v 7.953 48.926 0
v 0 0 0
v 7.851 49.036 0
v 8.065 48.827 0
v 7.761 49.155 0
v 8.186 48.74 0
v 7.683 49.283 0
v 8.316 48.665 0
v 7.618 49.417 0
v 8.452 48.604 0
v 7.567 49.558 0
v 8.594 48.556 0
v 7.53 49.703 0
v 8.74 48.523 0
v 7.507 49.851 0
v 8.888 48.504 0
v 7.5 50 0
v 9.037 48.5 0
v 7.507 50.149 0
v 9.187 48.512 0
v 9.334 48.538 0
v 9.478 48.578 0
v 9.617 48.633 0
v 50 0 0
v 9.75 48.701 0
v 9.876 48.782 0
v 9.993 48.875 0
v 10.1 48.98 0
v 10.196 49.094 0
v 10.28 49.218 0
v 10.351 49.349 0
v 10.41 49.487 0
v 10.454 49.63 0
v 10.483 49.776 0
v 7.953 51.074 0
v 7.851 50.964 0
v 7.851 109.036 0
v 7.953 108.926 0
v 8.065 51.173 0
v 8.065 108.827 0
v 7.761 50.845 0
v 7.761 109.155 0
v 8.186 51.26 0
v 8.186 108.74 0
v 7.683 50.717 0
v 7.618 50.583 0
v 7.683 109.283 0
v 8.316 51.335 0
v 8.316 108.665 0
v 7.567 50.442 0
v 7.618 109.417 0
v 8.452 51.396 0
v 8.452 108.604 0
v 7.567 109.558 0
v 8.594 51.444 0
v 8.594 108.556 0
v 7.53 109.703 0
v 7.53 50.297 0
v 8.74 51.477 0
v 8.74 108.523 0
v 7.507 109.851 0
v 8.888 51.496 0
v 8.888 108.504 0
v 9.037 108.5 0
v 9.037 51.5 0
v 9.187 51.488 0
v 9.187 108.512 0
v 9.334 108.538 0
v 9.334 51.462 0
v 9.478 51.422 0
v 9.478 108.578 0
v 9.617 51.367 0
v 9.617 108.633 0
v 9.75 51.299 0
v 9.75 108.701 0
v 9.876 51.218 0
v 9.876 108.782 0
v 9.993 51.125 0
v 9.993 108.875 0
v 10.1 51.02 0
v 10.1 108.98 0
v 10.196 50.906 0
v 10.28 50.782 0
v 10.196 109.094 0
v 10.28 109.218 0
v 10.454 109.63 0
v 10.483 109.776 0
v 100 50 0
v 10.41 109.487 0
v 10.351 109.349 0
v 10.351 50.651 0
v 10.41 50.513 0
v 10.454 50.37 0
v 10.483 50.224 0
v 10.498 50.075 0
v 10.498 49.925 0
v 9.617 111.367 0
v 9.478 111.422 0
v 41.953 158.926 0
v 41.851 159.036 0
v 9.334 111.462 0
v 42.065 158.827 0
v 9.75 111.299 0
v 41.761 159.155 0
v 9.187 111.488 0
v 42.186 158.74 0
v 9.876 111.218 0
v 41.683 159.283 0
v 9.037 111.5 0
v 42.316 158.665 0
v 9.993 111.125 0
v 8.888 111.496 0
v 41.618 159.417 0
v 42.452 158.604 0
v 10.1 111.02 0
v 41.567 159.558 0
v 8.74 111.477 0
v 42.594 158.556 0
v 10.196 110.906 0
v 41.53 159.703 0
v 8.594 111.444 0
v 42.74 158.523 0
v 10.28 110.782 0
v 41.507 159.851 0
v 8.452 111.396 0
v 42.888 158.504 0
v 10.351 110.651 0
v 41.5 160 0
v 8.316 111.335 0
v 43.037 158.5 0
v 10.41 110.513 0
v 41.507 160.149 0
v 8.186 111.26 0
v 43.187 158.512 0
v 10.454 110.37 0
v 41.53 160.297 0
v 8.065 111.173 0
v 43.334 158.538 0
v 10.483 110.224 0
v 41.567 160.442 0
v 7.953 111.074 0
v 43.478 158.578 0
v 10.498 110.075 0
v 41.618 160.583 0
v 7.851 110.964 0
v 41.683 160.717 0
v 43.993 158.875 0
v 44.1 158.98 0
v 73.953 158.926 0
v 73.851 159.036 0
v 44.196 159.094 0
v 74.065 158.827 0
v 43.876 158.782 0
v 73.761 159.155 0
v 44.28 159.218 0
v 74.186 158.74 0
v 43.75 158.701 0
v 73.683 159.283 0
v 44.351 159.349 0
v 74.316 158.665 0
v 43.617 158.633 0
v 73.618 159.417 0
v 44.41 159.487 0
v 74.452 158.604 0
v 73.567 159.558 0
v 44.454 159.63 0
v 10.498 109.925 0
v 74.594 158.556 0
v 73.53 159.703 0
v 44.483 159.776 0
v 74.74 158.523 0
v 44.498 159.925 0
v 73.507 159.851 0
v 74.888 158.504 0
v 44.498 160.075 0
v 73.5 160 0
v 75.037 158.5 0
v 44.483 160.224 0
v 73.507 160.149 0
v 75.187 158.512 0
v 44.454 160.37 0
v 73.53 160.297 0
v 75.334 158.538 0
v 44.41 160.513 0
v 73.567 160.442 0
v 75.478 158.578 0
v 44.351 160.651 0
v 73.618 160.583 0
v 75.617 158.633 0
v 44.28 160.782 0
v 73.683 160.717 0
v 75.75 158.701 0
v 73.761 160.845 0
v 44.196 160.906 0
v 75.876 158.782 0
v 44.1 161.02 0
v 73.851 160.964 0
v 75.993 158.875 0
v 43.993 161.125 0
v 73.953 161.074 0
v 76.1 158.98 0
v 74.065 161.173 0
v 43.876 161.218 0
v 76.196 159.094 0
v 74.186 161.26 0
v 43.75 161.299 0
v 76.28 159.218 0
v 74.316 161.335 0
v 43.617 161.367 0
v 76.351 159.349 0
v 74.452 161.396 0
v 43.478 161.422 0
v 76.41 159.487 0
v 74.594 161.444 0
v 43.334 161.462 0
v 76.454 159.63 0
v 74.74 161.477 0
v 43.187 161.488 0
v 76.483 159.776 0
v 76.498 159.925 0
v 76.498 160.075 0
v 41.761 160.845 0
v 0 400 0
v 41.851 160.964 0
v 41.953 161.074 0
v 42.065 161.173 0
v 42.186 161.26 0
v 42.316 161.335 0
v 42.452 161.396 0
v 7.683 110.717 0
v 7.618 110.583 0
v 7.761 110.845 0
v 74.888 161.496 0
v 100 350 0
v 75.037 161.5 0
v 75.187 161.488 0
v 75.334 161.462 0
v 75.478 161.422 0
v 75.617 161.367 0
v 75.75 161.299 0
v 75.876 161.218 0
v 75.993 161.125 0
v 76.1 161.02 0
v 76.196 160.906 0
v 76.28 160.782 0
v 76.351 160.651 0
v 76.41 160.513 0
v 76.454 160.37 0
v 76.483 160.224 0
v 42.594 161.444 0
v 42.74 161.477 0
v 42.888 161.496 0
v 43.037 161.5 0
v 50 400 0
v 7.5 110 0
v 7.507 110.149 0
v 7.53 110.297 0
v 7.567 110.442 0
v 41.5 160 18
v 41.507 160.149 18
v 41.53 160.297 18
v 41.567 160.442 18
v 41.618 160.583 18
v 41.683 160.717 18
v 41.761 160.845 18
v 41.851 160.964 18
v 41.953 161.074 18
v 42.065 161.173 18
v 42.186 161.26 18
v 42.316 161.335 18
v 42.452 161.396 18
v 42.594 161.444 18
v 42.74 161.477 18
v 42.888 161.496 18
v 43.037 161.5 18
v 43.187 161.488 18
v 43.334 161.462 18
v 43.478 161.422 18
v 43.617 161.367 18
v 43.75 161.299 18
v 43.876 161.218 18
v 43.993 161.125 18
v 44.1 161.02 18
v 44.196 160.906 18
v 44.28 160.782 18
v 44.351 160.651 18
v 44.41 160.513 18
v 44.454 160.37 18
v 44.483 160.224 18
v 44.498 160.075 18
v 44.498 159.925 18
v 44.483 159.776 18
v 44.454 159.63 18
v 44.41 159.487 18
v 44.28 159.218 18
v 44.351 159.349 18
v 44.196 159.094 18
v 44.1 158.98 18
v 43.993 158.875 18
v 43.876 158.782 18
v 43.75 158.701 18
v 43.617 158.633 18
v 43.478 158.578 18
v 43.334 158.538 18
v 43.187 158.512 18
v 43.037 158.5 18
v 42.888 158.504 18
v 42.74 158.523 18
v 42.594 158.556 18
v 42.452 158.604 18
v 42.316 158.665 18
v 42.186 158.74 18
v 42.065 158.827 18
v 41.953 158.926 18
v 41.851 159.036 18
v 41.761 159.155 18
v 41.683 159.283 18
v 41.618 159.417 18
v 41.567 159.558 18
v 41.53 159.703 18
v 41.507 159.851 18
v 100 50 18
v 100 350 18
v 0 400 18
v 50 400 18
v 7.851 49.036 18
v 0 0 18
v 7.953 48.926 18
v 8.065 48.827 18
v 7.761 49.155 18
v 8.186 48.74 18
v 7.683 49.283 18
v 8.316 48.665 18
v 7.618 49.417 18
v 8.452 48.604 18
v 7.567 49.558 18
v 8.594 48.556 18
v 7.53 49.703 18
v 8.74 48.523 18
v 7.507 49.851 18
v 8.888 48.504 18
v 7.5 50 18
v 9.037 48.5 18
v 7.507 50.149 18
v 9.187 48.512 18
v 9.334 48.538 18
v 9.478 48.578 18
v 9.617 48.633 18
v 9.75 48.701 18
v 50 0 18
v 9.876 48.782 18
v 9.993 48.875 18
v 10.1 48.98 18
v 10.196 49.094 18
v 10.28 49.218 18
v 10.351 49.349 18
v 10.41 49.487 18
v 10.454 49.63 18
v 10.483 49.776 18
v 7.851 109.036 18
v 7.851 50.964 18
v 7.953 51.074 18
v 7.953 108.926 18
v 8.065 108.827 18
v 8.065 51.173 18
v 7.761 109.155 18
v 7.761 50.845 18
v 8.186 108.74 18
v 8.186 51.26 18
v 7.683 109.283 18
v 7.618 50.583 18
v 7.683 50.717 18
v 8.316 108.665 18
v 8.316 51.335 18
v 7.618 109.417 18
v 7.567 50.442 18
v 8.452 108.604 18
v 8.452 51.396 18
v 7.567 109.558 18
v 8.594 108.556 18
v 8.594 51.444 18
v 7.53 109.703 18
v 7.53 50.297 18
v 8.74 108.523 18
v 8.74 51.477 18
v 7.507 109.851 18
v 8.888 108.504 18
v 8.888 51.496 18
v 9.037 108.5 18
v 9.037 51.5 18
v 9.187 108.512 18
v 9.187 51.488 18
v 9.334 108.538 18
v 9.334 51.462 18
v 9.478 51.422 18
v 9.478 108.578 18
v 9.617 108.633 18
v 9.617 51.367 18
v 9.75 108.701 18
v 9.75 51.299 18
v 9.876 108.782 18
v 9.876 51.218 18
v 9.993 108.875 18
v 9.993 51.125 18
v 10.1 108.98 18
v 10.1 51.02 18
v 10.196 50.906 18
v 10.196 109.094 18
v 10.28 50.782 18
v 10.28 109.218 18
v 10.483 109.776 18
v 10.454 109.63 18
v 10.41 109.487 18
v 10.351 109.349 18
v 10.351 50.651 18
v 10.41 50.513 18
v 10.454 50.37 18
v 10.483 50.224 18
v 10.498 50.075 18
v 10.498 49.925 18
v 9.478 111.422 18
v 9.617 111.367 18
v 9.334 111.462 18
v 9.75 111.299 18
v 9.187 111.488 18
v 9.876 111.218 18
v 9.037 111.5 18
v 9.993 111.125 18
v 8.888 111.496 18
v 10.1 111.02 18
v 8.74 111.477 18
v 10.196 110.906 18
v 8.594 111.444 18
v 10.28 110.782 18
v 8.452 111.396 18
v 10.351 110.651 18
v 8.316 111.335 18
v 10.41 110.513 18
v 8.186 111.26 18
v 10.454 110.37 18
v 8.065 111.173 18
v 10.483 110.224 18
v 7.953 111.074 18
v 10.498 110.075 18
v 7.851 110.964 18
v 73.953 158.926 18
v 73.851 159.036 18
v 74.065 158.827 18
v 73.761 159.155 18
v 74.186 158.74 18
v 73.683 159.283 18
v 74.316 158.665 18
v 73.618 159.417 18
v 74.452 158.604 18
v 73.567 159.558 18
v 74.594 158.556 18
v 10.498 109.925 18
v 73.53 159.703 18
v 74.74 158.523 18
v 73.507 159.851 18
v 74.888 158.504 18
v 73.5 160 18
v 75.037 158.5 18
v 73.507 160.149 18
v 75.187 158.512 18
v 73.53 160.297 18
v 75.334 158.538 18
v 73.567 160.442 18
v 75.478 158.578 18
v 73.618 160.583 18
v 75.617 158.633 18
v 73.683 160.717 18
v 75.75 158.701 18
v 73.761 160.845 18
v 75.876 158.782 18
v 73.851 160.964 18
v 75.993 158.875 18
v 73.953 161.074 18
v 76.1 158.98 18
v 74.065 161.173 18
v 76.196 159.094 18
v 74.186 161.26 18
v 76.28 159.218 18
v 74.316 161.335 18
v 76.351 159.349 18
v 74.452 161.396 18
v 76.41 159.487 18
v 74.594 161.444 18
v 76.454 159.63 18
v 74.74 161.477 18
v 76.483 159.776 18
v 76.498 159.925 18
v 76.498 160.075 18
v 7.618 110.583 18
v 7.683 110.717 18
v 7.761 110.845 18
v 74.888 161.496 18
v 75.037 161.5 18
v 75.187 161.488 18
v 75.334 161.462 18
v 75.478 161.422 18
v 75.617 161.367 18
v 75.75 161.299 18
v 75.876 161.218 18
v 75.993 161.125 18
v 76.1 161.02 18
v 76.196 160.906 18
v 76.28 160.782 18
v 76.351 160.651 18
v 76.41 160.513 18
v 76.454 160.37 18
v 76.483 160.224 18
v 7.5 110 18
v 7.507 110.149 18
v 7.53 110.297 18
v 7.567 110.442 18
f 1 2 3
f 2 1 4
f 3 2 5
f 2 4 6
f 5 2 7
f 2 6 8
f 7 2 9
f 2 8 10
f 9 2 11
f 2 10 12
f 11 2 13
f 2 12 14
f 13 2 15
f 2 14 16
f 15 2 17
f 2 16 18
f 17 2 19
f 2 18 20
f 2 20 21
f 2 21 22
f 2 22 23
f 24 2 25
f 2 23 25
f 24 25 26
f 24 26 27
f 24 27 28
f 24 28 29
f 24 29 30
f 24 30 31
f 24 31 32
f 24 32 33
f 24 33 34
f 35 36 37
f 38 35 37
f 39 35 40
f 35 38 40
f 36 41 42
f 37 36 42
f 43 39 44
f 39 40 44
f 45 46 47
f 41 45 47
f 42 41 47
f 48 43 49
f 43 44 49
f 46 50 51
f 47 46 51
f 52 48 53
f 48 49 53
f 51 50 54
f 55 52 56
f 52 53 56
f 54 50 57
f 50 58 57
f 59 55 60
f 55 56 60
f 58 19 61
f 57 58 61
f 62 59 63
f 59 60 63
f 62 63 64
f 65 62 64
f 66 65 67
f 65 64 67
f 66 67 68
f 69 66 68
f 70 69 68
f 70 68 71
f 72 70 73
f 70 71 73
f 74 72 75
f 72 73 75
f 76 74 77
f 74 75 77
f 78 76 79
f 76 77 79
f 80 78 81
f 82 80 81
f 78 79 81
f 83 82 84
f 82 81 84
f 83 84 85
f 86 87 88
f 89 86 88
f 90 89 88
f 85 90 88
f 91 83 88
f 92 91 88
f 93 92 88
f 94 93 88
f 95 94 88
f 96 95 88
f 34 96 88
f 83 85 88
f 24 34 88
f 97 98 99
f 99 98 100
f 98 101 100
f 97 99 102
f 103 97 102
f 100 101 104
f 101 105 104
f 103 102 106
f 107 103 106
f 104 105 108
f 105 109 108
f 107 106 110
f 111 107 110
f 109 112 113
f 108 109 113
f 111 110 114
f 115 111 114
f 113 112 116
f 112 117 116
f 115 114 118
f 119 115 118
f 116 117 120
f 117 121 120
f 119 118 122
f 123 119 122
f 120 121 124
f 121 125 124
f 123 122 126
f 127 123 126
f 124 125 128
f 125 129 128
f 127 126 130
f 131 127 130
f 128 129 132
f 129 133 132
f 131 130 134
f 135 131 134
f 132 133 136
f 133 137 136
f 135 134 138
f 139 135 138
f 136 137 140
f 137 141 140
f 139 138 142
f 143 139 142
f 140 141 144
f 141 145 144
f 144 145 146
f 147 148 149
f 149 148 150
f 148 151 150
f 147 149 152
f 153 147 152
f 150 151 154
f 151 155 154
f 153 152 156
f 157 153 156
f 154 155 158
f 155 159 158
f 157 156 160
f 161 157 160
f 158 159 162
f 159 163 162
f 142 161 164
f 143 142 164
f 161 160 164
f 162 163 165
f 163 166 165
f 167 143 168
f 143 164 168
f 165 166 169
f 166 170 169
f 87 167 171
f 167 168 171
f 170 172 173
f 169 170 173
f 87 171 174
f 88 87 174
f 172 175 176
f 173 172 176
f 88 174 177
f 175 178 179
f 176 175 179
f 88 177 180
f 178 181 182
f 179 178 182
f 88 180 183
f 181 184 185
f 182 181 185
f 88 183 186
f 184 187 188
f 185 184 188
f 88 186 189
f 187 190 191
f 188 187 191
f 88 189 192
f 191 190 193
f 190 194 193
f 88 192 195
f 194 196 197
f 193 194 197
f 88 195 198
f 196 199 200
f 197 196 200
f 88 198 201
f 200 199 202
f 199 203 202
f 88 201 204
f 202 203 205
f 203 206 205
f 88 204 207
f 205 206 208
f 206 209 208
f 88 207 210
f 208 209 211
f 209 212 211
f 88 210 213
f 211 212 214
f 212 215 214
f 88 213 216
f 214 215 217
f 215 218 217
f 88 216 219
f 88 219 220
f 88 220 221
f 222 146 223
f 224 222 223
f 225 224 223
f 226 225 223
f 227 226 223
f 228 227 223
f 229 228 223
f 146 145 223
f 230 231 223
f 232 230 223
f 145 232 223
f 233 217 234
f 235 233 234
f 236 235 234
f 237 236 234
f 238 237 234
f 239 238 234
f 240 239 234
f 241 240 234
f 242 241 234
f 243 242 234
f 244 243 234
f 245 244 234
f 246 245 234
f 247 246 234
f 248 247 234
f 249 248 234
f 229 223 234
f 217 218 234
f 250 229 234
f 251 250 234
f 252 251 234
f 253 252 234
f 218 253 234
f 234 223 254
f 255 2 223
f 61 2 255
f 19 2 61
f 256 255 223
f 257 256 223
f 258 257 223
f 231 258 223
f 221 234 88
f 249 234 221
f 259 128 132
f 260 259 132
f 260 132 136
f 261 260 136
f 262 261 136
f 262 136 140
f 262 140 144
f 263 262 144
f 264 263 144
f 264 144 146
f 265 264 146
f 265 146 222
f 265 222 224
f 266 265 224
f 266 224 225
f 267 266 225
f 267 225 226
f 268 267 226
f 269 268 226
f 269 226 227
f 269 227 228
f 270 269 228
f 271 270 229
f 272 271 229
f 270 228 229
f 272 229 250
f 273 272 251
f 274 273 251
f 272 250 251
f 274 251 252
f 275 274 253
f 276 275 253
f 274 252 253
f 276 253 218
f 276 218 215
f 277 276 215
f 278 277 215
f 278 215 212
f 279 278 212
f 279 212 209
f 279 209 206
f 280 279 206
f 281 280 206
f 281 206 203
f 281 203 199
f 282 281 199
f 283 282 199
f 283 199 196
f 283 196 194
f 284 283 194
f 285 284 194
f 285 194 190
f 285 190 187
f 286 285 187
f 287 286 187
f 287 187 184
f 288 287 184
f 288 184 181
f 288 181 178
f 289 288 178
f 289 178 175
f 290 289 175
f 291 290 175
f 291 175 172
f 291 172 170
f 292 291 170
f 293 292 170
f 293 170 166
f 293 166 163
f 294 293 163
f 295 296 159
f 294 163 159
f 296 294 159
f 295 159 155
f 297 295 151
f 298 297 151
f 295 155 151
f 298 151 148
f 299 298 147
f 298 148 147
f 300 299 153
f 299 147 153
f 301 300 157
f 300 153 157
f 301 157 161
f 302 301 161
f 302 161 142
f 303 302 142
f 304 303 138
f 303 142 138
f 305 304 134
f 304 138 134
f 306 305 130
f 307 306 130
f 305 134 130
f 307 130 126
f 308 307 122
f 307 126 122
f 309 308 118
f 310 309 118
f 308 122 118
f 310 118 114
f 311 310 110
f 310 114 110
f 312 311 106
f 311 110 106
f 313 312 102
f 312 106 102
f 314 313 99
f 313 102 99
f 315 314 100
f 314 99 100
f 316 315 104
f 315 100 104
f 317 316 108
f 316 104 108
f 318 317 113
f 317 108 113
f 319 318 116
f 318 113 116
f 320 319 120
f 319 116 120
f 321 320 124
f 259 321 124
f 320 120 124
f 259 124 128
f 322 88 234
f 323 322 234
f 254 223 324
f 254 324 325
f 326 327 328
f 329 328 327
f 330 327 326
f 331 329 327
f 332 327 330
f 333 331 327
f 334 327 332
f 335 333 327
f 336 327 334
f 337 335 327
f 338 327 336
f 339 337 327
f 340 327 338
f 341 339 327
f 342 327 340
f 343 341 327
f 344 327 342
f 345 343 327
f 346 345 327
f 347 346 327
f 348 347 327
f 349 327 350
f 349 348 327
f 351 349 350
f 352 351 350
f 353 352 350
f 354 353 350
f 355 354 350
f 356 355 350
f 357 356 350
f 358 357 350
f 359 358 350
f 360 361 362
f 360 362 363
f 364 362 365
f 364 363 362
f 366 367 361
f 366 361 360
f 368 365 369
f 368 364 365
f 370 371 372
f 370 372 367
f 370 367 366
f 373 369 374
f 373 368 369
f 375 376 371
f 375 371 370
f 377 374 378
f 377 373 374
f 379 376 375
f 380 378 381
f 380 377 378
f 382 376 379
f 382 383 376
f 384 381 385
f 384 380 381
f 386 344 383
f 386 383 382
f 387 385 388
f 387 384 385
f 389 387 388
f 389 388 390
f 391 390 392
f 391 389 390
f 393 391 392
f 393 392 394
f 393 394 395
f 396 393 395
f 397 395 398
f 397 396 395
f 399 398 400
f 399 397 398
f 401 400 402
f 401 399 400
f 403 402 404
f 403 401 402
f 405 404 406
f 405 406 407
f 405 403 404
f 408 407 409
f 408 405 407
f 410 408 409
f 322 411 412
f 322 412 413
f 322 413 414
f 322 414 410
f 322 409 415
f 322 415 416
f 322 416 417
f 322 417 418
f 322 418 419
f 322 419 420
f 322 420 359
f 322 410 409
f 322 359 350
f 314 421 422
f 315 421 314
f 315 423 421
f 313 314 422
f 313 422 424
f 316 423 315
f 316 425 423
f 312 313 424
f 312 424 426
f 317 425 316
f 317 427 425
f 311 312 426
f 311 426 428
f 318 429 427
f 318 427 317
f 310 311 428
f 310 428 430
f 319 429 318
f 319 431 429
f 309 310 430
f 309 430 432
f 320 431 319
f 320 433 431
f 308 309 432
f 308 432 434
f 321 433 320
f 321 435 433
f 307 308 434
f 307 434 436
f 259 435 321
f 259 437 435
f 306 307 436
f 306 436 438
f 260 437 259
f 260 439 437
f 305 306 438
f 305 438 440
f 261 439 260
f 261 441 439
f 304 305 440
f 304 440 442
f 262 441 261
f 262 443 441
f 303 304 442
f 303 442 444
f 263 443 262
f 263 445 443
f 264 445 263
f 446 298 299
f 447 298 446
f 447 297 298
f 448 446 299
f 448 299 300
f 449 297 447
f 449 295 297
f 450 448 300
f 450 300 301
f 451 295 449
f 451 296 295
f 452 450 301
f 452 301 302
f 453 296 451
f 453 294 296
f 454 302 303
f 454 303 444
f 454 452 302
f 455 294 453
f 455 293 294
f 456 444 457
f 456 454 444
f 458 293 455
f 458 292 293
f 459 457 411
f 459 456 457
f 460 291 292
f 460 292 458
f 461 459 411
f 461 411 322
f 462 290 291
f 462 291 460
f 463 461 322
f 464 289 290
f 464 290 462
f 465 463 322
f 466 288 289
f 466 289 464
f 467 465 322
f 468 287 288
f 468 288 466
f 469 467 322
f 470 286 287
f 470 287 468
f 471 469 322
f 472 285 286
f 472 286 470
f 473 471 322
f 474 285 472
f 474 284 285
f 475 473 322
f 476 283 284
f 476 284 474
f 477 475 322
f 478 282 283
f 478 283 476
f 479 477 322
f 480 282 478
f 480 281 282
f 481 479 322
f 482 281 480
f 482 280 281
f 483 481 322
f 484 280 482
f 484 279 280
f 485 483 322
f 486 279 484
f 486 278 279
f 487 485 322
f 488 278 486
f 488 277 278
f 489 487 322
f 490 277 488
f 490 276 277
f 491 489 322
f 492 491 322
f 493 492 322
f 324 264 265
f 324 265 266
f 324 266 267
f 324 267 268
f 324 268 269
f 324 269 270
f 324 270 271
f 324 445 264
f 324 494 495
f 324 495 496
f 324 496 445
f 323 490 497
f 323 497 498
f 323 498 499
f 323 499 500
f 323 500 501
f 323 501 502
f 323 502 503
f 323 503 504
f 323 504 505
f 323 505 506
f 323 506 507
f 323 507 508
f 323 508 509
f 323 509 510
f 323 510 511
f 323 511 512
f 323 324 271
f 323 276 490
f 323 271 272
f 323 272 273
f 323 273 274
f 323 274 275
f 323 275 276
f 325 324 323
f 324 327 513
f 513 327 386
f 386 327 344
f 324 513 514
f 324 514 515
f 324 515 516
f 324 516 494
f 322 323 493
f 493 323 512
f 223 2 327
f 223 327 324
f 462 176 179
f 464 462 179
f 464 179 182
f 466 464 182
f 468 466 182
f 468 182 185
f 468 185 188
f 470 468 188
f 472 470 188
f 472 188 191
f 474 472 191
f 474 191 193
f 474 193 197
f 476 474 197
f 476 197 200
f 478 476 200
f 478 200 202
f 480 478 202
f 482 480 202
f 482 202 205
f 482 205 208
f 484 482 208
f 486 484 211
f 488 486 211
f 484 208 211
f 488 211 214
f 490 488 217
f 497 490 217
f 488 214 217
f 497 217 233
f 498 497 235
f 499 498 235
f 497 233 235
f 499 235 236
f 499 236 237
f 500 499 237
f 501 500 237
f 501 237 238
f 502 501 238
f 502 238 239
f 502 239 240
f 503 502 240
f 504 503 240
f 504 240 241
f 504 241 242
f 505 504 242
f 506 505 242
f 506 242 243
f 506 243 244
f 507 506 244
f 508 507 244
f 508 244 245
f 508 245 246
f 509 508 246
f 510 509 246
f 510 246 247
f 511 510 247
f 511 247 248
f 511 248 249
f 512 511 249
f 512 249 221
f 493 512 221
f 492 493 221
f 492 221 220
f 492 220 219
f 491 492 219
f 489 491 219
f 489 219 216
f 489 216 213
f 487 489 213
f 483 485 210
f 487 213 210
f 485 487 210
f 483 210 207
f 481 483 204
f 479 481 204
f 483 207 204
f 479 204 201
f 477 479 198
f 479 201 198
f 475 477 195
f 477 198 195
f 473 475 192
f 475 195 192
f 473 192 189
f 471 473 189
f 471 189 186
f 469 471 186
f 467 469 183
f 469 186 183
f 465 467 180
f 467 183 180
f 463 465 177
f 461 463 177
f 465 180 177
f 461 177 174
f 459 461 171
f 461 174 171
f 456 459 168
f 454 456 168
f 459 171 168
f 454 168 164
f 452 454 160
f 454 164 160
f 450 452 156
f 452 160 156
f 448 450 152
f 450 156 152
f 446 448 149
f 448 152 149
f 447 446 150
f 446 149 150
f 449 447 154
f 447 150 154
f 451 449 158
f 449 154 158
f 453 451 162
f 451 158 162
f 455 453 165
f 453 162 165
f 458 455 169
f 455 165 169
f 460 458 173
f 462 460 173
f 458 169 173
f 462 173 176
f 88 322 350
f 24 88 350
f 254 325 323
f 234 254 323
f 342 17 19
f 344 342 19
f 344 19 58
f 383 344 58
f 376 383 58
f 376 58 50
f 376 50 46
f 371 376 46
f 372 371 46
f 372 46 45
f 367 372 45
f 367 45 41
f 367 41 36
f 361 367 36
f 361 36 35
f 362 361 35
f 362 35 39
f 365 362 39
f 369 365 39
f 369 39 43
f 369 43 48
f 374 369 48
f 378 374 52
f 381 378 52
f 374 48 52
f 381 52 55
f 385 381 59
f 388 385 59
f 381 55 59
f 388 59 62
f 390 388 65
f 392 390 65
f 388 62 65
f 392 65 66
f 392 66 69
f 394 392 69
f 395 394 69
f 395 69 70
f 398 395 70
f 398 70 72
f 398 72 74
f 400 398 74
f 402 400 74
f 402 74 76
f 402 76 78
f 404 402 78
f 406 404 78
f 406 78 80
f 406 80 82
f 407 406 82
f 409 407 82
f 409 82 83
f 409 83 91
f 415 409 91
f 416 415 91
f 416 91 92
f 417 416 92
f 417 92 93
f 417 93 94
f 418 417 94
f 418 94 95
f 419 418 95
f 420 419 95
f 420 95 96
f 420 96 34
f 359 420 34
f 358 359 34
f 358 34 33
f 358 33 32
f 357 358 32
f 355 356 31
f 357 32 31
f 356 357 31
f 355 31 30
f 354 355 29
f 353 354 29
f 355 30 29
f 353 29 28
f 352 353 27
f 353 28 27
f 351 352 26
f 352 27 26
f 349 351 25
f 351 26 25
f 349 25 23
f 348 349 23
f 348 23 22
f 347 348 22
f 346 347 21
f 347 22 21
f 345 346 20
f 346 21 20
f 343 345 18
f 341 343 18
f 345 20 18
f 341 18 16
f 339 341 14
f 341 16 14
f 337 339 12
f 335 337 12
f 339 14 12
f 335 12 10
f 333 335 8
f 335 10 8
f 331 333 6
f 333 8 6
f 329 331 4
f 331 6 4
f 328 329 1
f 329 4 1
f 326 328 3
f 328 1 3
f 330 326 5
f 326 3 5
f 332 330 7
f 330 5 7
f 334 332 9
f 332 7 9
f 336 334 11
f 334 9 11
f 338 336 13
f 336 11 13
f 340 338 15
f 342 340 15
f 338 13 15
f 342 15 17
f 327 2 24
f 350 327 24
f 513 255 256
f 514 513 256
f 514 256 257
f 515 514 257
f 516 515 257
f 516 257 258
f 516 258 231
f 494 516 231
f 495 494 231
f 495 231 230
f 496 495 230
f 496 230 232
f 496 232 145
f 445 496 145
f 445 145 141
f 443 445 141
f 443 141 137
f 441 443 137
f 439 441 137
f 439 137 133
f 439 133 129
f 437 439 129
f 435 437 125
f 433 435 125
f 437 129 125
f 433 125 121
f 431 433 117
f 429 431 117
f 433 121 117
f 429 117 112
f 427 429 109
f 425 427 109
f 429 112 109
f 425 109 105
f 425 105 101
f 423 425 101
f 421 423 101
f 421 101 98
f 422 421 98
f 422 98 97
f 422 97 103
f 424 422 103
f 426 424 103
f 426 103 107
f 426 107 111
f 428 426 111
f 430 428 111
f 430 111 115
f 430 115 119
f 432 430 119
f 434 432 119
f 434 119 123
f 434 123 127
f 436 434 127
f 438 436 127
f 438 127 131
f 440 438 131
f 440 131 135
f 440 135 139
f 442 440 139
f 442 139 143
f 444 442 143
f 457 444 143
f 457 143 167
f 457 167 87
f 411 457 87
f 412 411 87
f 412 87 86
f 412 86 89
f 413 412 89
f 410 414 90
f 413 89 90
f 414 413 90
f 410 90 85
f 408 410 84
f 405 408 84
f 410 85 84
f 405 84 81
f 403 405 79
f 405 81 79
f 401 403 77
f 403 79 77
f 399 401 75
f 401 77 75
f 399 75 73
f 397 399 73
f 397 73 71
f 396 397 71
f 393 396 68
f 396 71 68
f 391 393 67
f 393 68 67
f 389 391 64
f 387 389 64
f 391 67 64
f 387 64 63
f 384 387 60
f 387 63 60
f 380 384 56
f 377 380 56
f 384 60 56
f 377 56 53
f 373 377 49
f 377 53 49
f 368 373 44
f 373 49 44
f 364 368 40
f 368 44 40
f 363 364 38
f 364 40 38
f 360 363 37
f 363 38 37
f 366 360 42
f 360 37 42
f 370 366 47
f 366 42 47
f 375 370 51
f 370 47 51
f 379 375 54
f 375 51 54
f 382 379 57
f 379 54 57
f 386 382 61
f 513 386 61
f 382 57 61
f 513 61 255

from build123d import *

# Parameters (mm, degrees)
ESBO_O6_W                = 100
ESBO_O6_H                = 400
RESSALTO_EXTRUS_O2_DEPTH = 18
CORTE_EXTRUS_O2_DEPTH    = 413.703283244
ESBO_O8_R                = 1.5
CORTE_EXTRUS_O3_DEPTH    = 413.703283244


with BuildPart() as part:
    # Esboço6 → Ressalto-extrusão2 (new body)
    with BuildSketch(Plane.XY):
        with Locations((50, 200)):
            Rectangle(ESBO_O6_W, ESBO_O6_H)
    extrude(amount=RESSALTO_EXTRUS_O2_DEPTH)

    # Esboço7 → Corte-extrusão2 (cut, through all)
    with BuildSketch(Plane.XY.offset(18)):
        Polygon((50, 400), (100, 350), (100, 400), align=None)
        Polygon((100, 50), (50, 0), (100, 0), align=None)
    extrude(amount=-CORTE_EXTRUS_O2_DEPTH, mode=Mode.SUBTRACT)

    # Esboço8 → Corte-extrusão3 (cut, through all)
    with BuildSketch(Plane(origin=(0, 0, 0), x_dir=(-1, 0, 0), z_dir=(0, 0, -1))):
        with Locations((-75, 160)):
            Circle(ESBO_O8_R)
        with Locations((-43, 160)):
            Circle(ESBO_O8_R)
        with Locations((-9, 50)):
            Circle(ESBO_O8_R)
        with Locations((-9, 110)):
            Circle(ESBO_O8_R)
    extrude(amount=-CORTE_EXTRUS_O3_DEPTH, mode=Mode.SUBTRACT)


solid = part.part
